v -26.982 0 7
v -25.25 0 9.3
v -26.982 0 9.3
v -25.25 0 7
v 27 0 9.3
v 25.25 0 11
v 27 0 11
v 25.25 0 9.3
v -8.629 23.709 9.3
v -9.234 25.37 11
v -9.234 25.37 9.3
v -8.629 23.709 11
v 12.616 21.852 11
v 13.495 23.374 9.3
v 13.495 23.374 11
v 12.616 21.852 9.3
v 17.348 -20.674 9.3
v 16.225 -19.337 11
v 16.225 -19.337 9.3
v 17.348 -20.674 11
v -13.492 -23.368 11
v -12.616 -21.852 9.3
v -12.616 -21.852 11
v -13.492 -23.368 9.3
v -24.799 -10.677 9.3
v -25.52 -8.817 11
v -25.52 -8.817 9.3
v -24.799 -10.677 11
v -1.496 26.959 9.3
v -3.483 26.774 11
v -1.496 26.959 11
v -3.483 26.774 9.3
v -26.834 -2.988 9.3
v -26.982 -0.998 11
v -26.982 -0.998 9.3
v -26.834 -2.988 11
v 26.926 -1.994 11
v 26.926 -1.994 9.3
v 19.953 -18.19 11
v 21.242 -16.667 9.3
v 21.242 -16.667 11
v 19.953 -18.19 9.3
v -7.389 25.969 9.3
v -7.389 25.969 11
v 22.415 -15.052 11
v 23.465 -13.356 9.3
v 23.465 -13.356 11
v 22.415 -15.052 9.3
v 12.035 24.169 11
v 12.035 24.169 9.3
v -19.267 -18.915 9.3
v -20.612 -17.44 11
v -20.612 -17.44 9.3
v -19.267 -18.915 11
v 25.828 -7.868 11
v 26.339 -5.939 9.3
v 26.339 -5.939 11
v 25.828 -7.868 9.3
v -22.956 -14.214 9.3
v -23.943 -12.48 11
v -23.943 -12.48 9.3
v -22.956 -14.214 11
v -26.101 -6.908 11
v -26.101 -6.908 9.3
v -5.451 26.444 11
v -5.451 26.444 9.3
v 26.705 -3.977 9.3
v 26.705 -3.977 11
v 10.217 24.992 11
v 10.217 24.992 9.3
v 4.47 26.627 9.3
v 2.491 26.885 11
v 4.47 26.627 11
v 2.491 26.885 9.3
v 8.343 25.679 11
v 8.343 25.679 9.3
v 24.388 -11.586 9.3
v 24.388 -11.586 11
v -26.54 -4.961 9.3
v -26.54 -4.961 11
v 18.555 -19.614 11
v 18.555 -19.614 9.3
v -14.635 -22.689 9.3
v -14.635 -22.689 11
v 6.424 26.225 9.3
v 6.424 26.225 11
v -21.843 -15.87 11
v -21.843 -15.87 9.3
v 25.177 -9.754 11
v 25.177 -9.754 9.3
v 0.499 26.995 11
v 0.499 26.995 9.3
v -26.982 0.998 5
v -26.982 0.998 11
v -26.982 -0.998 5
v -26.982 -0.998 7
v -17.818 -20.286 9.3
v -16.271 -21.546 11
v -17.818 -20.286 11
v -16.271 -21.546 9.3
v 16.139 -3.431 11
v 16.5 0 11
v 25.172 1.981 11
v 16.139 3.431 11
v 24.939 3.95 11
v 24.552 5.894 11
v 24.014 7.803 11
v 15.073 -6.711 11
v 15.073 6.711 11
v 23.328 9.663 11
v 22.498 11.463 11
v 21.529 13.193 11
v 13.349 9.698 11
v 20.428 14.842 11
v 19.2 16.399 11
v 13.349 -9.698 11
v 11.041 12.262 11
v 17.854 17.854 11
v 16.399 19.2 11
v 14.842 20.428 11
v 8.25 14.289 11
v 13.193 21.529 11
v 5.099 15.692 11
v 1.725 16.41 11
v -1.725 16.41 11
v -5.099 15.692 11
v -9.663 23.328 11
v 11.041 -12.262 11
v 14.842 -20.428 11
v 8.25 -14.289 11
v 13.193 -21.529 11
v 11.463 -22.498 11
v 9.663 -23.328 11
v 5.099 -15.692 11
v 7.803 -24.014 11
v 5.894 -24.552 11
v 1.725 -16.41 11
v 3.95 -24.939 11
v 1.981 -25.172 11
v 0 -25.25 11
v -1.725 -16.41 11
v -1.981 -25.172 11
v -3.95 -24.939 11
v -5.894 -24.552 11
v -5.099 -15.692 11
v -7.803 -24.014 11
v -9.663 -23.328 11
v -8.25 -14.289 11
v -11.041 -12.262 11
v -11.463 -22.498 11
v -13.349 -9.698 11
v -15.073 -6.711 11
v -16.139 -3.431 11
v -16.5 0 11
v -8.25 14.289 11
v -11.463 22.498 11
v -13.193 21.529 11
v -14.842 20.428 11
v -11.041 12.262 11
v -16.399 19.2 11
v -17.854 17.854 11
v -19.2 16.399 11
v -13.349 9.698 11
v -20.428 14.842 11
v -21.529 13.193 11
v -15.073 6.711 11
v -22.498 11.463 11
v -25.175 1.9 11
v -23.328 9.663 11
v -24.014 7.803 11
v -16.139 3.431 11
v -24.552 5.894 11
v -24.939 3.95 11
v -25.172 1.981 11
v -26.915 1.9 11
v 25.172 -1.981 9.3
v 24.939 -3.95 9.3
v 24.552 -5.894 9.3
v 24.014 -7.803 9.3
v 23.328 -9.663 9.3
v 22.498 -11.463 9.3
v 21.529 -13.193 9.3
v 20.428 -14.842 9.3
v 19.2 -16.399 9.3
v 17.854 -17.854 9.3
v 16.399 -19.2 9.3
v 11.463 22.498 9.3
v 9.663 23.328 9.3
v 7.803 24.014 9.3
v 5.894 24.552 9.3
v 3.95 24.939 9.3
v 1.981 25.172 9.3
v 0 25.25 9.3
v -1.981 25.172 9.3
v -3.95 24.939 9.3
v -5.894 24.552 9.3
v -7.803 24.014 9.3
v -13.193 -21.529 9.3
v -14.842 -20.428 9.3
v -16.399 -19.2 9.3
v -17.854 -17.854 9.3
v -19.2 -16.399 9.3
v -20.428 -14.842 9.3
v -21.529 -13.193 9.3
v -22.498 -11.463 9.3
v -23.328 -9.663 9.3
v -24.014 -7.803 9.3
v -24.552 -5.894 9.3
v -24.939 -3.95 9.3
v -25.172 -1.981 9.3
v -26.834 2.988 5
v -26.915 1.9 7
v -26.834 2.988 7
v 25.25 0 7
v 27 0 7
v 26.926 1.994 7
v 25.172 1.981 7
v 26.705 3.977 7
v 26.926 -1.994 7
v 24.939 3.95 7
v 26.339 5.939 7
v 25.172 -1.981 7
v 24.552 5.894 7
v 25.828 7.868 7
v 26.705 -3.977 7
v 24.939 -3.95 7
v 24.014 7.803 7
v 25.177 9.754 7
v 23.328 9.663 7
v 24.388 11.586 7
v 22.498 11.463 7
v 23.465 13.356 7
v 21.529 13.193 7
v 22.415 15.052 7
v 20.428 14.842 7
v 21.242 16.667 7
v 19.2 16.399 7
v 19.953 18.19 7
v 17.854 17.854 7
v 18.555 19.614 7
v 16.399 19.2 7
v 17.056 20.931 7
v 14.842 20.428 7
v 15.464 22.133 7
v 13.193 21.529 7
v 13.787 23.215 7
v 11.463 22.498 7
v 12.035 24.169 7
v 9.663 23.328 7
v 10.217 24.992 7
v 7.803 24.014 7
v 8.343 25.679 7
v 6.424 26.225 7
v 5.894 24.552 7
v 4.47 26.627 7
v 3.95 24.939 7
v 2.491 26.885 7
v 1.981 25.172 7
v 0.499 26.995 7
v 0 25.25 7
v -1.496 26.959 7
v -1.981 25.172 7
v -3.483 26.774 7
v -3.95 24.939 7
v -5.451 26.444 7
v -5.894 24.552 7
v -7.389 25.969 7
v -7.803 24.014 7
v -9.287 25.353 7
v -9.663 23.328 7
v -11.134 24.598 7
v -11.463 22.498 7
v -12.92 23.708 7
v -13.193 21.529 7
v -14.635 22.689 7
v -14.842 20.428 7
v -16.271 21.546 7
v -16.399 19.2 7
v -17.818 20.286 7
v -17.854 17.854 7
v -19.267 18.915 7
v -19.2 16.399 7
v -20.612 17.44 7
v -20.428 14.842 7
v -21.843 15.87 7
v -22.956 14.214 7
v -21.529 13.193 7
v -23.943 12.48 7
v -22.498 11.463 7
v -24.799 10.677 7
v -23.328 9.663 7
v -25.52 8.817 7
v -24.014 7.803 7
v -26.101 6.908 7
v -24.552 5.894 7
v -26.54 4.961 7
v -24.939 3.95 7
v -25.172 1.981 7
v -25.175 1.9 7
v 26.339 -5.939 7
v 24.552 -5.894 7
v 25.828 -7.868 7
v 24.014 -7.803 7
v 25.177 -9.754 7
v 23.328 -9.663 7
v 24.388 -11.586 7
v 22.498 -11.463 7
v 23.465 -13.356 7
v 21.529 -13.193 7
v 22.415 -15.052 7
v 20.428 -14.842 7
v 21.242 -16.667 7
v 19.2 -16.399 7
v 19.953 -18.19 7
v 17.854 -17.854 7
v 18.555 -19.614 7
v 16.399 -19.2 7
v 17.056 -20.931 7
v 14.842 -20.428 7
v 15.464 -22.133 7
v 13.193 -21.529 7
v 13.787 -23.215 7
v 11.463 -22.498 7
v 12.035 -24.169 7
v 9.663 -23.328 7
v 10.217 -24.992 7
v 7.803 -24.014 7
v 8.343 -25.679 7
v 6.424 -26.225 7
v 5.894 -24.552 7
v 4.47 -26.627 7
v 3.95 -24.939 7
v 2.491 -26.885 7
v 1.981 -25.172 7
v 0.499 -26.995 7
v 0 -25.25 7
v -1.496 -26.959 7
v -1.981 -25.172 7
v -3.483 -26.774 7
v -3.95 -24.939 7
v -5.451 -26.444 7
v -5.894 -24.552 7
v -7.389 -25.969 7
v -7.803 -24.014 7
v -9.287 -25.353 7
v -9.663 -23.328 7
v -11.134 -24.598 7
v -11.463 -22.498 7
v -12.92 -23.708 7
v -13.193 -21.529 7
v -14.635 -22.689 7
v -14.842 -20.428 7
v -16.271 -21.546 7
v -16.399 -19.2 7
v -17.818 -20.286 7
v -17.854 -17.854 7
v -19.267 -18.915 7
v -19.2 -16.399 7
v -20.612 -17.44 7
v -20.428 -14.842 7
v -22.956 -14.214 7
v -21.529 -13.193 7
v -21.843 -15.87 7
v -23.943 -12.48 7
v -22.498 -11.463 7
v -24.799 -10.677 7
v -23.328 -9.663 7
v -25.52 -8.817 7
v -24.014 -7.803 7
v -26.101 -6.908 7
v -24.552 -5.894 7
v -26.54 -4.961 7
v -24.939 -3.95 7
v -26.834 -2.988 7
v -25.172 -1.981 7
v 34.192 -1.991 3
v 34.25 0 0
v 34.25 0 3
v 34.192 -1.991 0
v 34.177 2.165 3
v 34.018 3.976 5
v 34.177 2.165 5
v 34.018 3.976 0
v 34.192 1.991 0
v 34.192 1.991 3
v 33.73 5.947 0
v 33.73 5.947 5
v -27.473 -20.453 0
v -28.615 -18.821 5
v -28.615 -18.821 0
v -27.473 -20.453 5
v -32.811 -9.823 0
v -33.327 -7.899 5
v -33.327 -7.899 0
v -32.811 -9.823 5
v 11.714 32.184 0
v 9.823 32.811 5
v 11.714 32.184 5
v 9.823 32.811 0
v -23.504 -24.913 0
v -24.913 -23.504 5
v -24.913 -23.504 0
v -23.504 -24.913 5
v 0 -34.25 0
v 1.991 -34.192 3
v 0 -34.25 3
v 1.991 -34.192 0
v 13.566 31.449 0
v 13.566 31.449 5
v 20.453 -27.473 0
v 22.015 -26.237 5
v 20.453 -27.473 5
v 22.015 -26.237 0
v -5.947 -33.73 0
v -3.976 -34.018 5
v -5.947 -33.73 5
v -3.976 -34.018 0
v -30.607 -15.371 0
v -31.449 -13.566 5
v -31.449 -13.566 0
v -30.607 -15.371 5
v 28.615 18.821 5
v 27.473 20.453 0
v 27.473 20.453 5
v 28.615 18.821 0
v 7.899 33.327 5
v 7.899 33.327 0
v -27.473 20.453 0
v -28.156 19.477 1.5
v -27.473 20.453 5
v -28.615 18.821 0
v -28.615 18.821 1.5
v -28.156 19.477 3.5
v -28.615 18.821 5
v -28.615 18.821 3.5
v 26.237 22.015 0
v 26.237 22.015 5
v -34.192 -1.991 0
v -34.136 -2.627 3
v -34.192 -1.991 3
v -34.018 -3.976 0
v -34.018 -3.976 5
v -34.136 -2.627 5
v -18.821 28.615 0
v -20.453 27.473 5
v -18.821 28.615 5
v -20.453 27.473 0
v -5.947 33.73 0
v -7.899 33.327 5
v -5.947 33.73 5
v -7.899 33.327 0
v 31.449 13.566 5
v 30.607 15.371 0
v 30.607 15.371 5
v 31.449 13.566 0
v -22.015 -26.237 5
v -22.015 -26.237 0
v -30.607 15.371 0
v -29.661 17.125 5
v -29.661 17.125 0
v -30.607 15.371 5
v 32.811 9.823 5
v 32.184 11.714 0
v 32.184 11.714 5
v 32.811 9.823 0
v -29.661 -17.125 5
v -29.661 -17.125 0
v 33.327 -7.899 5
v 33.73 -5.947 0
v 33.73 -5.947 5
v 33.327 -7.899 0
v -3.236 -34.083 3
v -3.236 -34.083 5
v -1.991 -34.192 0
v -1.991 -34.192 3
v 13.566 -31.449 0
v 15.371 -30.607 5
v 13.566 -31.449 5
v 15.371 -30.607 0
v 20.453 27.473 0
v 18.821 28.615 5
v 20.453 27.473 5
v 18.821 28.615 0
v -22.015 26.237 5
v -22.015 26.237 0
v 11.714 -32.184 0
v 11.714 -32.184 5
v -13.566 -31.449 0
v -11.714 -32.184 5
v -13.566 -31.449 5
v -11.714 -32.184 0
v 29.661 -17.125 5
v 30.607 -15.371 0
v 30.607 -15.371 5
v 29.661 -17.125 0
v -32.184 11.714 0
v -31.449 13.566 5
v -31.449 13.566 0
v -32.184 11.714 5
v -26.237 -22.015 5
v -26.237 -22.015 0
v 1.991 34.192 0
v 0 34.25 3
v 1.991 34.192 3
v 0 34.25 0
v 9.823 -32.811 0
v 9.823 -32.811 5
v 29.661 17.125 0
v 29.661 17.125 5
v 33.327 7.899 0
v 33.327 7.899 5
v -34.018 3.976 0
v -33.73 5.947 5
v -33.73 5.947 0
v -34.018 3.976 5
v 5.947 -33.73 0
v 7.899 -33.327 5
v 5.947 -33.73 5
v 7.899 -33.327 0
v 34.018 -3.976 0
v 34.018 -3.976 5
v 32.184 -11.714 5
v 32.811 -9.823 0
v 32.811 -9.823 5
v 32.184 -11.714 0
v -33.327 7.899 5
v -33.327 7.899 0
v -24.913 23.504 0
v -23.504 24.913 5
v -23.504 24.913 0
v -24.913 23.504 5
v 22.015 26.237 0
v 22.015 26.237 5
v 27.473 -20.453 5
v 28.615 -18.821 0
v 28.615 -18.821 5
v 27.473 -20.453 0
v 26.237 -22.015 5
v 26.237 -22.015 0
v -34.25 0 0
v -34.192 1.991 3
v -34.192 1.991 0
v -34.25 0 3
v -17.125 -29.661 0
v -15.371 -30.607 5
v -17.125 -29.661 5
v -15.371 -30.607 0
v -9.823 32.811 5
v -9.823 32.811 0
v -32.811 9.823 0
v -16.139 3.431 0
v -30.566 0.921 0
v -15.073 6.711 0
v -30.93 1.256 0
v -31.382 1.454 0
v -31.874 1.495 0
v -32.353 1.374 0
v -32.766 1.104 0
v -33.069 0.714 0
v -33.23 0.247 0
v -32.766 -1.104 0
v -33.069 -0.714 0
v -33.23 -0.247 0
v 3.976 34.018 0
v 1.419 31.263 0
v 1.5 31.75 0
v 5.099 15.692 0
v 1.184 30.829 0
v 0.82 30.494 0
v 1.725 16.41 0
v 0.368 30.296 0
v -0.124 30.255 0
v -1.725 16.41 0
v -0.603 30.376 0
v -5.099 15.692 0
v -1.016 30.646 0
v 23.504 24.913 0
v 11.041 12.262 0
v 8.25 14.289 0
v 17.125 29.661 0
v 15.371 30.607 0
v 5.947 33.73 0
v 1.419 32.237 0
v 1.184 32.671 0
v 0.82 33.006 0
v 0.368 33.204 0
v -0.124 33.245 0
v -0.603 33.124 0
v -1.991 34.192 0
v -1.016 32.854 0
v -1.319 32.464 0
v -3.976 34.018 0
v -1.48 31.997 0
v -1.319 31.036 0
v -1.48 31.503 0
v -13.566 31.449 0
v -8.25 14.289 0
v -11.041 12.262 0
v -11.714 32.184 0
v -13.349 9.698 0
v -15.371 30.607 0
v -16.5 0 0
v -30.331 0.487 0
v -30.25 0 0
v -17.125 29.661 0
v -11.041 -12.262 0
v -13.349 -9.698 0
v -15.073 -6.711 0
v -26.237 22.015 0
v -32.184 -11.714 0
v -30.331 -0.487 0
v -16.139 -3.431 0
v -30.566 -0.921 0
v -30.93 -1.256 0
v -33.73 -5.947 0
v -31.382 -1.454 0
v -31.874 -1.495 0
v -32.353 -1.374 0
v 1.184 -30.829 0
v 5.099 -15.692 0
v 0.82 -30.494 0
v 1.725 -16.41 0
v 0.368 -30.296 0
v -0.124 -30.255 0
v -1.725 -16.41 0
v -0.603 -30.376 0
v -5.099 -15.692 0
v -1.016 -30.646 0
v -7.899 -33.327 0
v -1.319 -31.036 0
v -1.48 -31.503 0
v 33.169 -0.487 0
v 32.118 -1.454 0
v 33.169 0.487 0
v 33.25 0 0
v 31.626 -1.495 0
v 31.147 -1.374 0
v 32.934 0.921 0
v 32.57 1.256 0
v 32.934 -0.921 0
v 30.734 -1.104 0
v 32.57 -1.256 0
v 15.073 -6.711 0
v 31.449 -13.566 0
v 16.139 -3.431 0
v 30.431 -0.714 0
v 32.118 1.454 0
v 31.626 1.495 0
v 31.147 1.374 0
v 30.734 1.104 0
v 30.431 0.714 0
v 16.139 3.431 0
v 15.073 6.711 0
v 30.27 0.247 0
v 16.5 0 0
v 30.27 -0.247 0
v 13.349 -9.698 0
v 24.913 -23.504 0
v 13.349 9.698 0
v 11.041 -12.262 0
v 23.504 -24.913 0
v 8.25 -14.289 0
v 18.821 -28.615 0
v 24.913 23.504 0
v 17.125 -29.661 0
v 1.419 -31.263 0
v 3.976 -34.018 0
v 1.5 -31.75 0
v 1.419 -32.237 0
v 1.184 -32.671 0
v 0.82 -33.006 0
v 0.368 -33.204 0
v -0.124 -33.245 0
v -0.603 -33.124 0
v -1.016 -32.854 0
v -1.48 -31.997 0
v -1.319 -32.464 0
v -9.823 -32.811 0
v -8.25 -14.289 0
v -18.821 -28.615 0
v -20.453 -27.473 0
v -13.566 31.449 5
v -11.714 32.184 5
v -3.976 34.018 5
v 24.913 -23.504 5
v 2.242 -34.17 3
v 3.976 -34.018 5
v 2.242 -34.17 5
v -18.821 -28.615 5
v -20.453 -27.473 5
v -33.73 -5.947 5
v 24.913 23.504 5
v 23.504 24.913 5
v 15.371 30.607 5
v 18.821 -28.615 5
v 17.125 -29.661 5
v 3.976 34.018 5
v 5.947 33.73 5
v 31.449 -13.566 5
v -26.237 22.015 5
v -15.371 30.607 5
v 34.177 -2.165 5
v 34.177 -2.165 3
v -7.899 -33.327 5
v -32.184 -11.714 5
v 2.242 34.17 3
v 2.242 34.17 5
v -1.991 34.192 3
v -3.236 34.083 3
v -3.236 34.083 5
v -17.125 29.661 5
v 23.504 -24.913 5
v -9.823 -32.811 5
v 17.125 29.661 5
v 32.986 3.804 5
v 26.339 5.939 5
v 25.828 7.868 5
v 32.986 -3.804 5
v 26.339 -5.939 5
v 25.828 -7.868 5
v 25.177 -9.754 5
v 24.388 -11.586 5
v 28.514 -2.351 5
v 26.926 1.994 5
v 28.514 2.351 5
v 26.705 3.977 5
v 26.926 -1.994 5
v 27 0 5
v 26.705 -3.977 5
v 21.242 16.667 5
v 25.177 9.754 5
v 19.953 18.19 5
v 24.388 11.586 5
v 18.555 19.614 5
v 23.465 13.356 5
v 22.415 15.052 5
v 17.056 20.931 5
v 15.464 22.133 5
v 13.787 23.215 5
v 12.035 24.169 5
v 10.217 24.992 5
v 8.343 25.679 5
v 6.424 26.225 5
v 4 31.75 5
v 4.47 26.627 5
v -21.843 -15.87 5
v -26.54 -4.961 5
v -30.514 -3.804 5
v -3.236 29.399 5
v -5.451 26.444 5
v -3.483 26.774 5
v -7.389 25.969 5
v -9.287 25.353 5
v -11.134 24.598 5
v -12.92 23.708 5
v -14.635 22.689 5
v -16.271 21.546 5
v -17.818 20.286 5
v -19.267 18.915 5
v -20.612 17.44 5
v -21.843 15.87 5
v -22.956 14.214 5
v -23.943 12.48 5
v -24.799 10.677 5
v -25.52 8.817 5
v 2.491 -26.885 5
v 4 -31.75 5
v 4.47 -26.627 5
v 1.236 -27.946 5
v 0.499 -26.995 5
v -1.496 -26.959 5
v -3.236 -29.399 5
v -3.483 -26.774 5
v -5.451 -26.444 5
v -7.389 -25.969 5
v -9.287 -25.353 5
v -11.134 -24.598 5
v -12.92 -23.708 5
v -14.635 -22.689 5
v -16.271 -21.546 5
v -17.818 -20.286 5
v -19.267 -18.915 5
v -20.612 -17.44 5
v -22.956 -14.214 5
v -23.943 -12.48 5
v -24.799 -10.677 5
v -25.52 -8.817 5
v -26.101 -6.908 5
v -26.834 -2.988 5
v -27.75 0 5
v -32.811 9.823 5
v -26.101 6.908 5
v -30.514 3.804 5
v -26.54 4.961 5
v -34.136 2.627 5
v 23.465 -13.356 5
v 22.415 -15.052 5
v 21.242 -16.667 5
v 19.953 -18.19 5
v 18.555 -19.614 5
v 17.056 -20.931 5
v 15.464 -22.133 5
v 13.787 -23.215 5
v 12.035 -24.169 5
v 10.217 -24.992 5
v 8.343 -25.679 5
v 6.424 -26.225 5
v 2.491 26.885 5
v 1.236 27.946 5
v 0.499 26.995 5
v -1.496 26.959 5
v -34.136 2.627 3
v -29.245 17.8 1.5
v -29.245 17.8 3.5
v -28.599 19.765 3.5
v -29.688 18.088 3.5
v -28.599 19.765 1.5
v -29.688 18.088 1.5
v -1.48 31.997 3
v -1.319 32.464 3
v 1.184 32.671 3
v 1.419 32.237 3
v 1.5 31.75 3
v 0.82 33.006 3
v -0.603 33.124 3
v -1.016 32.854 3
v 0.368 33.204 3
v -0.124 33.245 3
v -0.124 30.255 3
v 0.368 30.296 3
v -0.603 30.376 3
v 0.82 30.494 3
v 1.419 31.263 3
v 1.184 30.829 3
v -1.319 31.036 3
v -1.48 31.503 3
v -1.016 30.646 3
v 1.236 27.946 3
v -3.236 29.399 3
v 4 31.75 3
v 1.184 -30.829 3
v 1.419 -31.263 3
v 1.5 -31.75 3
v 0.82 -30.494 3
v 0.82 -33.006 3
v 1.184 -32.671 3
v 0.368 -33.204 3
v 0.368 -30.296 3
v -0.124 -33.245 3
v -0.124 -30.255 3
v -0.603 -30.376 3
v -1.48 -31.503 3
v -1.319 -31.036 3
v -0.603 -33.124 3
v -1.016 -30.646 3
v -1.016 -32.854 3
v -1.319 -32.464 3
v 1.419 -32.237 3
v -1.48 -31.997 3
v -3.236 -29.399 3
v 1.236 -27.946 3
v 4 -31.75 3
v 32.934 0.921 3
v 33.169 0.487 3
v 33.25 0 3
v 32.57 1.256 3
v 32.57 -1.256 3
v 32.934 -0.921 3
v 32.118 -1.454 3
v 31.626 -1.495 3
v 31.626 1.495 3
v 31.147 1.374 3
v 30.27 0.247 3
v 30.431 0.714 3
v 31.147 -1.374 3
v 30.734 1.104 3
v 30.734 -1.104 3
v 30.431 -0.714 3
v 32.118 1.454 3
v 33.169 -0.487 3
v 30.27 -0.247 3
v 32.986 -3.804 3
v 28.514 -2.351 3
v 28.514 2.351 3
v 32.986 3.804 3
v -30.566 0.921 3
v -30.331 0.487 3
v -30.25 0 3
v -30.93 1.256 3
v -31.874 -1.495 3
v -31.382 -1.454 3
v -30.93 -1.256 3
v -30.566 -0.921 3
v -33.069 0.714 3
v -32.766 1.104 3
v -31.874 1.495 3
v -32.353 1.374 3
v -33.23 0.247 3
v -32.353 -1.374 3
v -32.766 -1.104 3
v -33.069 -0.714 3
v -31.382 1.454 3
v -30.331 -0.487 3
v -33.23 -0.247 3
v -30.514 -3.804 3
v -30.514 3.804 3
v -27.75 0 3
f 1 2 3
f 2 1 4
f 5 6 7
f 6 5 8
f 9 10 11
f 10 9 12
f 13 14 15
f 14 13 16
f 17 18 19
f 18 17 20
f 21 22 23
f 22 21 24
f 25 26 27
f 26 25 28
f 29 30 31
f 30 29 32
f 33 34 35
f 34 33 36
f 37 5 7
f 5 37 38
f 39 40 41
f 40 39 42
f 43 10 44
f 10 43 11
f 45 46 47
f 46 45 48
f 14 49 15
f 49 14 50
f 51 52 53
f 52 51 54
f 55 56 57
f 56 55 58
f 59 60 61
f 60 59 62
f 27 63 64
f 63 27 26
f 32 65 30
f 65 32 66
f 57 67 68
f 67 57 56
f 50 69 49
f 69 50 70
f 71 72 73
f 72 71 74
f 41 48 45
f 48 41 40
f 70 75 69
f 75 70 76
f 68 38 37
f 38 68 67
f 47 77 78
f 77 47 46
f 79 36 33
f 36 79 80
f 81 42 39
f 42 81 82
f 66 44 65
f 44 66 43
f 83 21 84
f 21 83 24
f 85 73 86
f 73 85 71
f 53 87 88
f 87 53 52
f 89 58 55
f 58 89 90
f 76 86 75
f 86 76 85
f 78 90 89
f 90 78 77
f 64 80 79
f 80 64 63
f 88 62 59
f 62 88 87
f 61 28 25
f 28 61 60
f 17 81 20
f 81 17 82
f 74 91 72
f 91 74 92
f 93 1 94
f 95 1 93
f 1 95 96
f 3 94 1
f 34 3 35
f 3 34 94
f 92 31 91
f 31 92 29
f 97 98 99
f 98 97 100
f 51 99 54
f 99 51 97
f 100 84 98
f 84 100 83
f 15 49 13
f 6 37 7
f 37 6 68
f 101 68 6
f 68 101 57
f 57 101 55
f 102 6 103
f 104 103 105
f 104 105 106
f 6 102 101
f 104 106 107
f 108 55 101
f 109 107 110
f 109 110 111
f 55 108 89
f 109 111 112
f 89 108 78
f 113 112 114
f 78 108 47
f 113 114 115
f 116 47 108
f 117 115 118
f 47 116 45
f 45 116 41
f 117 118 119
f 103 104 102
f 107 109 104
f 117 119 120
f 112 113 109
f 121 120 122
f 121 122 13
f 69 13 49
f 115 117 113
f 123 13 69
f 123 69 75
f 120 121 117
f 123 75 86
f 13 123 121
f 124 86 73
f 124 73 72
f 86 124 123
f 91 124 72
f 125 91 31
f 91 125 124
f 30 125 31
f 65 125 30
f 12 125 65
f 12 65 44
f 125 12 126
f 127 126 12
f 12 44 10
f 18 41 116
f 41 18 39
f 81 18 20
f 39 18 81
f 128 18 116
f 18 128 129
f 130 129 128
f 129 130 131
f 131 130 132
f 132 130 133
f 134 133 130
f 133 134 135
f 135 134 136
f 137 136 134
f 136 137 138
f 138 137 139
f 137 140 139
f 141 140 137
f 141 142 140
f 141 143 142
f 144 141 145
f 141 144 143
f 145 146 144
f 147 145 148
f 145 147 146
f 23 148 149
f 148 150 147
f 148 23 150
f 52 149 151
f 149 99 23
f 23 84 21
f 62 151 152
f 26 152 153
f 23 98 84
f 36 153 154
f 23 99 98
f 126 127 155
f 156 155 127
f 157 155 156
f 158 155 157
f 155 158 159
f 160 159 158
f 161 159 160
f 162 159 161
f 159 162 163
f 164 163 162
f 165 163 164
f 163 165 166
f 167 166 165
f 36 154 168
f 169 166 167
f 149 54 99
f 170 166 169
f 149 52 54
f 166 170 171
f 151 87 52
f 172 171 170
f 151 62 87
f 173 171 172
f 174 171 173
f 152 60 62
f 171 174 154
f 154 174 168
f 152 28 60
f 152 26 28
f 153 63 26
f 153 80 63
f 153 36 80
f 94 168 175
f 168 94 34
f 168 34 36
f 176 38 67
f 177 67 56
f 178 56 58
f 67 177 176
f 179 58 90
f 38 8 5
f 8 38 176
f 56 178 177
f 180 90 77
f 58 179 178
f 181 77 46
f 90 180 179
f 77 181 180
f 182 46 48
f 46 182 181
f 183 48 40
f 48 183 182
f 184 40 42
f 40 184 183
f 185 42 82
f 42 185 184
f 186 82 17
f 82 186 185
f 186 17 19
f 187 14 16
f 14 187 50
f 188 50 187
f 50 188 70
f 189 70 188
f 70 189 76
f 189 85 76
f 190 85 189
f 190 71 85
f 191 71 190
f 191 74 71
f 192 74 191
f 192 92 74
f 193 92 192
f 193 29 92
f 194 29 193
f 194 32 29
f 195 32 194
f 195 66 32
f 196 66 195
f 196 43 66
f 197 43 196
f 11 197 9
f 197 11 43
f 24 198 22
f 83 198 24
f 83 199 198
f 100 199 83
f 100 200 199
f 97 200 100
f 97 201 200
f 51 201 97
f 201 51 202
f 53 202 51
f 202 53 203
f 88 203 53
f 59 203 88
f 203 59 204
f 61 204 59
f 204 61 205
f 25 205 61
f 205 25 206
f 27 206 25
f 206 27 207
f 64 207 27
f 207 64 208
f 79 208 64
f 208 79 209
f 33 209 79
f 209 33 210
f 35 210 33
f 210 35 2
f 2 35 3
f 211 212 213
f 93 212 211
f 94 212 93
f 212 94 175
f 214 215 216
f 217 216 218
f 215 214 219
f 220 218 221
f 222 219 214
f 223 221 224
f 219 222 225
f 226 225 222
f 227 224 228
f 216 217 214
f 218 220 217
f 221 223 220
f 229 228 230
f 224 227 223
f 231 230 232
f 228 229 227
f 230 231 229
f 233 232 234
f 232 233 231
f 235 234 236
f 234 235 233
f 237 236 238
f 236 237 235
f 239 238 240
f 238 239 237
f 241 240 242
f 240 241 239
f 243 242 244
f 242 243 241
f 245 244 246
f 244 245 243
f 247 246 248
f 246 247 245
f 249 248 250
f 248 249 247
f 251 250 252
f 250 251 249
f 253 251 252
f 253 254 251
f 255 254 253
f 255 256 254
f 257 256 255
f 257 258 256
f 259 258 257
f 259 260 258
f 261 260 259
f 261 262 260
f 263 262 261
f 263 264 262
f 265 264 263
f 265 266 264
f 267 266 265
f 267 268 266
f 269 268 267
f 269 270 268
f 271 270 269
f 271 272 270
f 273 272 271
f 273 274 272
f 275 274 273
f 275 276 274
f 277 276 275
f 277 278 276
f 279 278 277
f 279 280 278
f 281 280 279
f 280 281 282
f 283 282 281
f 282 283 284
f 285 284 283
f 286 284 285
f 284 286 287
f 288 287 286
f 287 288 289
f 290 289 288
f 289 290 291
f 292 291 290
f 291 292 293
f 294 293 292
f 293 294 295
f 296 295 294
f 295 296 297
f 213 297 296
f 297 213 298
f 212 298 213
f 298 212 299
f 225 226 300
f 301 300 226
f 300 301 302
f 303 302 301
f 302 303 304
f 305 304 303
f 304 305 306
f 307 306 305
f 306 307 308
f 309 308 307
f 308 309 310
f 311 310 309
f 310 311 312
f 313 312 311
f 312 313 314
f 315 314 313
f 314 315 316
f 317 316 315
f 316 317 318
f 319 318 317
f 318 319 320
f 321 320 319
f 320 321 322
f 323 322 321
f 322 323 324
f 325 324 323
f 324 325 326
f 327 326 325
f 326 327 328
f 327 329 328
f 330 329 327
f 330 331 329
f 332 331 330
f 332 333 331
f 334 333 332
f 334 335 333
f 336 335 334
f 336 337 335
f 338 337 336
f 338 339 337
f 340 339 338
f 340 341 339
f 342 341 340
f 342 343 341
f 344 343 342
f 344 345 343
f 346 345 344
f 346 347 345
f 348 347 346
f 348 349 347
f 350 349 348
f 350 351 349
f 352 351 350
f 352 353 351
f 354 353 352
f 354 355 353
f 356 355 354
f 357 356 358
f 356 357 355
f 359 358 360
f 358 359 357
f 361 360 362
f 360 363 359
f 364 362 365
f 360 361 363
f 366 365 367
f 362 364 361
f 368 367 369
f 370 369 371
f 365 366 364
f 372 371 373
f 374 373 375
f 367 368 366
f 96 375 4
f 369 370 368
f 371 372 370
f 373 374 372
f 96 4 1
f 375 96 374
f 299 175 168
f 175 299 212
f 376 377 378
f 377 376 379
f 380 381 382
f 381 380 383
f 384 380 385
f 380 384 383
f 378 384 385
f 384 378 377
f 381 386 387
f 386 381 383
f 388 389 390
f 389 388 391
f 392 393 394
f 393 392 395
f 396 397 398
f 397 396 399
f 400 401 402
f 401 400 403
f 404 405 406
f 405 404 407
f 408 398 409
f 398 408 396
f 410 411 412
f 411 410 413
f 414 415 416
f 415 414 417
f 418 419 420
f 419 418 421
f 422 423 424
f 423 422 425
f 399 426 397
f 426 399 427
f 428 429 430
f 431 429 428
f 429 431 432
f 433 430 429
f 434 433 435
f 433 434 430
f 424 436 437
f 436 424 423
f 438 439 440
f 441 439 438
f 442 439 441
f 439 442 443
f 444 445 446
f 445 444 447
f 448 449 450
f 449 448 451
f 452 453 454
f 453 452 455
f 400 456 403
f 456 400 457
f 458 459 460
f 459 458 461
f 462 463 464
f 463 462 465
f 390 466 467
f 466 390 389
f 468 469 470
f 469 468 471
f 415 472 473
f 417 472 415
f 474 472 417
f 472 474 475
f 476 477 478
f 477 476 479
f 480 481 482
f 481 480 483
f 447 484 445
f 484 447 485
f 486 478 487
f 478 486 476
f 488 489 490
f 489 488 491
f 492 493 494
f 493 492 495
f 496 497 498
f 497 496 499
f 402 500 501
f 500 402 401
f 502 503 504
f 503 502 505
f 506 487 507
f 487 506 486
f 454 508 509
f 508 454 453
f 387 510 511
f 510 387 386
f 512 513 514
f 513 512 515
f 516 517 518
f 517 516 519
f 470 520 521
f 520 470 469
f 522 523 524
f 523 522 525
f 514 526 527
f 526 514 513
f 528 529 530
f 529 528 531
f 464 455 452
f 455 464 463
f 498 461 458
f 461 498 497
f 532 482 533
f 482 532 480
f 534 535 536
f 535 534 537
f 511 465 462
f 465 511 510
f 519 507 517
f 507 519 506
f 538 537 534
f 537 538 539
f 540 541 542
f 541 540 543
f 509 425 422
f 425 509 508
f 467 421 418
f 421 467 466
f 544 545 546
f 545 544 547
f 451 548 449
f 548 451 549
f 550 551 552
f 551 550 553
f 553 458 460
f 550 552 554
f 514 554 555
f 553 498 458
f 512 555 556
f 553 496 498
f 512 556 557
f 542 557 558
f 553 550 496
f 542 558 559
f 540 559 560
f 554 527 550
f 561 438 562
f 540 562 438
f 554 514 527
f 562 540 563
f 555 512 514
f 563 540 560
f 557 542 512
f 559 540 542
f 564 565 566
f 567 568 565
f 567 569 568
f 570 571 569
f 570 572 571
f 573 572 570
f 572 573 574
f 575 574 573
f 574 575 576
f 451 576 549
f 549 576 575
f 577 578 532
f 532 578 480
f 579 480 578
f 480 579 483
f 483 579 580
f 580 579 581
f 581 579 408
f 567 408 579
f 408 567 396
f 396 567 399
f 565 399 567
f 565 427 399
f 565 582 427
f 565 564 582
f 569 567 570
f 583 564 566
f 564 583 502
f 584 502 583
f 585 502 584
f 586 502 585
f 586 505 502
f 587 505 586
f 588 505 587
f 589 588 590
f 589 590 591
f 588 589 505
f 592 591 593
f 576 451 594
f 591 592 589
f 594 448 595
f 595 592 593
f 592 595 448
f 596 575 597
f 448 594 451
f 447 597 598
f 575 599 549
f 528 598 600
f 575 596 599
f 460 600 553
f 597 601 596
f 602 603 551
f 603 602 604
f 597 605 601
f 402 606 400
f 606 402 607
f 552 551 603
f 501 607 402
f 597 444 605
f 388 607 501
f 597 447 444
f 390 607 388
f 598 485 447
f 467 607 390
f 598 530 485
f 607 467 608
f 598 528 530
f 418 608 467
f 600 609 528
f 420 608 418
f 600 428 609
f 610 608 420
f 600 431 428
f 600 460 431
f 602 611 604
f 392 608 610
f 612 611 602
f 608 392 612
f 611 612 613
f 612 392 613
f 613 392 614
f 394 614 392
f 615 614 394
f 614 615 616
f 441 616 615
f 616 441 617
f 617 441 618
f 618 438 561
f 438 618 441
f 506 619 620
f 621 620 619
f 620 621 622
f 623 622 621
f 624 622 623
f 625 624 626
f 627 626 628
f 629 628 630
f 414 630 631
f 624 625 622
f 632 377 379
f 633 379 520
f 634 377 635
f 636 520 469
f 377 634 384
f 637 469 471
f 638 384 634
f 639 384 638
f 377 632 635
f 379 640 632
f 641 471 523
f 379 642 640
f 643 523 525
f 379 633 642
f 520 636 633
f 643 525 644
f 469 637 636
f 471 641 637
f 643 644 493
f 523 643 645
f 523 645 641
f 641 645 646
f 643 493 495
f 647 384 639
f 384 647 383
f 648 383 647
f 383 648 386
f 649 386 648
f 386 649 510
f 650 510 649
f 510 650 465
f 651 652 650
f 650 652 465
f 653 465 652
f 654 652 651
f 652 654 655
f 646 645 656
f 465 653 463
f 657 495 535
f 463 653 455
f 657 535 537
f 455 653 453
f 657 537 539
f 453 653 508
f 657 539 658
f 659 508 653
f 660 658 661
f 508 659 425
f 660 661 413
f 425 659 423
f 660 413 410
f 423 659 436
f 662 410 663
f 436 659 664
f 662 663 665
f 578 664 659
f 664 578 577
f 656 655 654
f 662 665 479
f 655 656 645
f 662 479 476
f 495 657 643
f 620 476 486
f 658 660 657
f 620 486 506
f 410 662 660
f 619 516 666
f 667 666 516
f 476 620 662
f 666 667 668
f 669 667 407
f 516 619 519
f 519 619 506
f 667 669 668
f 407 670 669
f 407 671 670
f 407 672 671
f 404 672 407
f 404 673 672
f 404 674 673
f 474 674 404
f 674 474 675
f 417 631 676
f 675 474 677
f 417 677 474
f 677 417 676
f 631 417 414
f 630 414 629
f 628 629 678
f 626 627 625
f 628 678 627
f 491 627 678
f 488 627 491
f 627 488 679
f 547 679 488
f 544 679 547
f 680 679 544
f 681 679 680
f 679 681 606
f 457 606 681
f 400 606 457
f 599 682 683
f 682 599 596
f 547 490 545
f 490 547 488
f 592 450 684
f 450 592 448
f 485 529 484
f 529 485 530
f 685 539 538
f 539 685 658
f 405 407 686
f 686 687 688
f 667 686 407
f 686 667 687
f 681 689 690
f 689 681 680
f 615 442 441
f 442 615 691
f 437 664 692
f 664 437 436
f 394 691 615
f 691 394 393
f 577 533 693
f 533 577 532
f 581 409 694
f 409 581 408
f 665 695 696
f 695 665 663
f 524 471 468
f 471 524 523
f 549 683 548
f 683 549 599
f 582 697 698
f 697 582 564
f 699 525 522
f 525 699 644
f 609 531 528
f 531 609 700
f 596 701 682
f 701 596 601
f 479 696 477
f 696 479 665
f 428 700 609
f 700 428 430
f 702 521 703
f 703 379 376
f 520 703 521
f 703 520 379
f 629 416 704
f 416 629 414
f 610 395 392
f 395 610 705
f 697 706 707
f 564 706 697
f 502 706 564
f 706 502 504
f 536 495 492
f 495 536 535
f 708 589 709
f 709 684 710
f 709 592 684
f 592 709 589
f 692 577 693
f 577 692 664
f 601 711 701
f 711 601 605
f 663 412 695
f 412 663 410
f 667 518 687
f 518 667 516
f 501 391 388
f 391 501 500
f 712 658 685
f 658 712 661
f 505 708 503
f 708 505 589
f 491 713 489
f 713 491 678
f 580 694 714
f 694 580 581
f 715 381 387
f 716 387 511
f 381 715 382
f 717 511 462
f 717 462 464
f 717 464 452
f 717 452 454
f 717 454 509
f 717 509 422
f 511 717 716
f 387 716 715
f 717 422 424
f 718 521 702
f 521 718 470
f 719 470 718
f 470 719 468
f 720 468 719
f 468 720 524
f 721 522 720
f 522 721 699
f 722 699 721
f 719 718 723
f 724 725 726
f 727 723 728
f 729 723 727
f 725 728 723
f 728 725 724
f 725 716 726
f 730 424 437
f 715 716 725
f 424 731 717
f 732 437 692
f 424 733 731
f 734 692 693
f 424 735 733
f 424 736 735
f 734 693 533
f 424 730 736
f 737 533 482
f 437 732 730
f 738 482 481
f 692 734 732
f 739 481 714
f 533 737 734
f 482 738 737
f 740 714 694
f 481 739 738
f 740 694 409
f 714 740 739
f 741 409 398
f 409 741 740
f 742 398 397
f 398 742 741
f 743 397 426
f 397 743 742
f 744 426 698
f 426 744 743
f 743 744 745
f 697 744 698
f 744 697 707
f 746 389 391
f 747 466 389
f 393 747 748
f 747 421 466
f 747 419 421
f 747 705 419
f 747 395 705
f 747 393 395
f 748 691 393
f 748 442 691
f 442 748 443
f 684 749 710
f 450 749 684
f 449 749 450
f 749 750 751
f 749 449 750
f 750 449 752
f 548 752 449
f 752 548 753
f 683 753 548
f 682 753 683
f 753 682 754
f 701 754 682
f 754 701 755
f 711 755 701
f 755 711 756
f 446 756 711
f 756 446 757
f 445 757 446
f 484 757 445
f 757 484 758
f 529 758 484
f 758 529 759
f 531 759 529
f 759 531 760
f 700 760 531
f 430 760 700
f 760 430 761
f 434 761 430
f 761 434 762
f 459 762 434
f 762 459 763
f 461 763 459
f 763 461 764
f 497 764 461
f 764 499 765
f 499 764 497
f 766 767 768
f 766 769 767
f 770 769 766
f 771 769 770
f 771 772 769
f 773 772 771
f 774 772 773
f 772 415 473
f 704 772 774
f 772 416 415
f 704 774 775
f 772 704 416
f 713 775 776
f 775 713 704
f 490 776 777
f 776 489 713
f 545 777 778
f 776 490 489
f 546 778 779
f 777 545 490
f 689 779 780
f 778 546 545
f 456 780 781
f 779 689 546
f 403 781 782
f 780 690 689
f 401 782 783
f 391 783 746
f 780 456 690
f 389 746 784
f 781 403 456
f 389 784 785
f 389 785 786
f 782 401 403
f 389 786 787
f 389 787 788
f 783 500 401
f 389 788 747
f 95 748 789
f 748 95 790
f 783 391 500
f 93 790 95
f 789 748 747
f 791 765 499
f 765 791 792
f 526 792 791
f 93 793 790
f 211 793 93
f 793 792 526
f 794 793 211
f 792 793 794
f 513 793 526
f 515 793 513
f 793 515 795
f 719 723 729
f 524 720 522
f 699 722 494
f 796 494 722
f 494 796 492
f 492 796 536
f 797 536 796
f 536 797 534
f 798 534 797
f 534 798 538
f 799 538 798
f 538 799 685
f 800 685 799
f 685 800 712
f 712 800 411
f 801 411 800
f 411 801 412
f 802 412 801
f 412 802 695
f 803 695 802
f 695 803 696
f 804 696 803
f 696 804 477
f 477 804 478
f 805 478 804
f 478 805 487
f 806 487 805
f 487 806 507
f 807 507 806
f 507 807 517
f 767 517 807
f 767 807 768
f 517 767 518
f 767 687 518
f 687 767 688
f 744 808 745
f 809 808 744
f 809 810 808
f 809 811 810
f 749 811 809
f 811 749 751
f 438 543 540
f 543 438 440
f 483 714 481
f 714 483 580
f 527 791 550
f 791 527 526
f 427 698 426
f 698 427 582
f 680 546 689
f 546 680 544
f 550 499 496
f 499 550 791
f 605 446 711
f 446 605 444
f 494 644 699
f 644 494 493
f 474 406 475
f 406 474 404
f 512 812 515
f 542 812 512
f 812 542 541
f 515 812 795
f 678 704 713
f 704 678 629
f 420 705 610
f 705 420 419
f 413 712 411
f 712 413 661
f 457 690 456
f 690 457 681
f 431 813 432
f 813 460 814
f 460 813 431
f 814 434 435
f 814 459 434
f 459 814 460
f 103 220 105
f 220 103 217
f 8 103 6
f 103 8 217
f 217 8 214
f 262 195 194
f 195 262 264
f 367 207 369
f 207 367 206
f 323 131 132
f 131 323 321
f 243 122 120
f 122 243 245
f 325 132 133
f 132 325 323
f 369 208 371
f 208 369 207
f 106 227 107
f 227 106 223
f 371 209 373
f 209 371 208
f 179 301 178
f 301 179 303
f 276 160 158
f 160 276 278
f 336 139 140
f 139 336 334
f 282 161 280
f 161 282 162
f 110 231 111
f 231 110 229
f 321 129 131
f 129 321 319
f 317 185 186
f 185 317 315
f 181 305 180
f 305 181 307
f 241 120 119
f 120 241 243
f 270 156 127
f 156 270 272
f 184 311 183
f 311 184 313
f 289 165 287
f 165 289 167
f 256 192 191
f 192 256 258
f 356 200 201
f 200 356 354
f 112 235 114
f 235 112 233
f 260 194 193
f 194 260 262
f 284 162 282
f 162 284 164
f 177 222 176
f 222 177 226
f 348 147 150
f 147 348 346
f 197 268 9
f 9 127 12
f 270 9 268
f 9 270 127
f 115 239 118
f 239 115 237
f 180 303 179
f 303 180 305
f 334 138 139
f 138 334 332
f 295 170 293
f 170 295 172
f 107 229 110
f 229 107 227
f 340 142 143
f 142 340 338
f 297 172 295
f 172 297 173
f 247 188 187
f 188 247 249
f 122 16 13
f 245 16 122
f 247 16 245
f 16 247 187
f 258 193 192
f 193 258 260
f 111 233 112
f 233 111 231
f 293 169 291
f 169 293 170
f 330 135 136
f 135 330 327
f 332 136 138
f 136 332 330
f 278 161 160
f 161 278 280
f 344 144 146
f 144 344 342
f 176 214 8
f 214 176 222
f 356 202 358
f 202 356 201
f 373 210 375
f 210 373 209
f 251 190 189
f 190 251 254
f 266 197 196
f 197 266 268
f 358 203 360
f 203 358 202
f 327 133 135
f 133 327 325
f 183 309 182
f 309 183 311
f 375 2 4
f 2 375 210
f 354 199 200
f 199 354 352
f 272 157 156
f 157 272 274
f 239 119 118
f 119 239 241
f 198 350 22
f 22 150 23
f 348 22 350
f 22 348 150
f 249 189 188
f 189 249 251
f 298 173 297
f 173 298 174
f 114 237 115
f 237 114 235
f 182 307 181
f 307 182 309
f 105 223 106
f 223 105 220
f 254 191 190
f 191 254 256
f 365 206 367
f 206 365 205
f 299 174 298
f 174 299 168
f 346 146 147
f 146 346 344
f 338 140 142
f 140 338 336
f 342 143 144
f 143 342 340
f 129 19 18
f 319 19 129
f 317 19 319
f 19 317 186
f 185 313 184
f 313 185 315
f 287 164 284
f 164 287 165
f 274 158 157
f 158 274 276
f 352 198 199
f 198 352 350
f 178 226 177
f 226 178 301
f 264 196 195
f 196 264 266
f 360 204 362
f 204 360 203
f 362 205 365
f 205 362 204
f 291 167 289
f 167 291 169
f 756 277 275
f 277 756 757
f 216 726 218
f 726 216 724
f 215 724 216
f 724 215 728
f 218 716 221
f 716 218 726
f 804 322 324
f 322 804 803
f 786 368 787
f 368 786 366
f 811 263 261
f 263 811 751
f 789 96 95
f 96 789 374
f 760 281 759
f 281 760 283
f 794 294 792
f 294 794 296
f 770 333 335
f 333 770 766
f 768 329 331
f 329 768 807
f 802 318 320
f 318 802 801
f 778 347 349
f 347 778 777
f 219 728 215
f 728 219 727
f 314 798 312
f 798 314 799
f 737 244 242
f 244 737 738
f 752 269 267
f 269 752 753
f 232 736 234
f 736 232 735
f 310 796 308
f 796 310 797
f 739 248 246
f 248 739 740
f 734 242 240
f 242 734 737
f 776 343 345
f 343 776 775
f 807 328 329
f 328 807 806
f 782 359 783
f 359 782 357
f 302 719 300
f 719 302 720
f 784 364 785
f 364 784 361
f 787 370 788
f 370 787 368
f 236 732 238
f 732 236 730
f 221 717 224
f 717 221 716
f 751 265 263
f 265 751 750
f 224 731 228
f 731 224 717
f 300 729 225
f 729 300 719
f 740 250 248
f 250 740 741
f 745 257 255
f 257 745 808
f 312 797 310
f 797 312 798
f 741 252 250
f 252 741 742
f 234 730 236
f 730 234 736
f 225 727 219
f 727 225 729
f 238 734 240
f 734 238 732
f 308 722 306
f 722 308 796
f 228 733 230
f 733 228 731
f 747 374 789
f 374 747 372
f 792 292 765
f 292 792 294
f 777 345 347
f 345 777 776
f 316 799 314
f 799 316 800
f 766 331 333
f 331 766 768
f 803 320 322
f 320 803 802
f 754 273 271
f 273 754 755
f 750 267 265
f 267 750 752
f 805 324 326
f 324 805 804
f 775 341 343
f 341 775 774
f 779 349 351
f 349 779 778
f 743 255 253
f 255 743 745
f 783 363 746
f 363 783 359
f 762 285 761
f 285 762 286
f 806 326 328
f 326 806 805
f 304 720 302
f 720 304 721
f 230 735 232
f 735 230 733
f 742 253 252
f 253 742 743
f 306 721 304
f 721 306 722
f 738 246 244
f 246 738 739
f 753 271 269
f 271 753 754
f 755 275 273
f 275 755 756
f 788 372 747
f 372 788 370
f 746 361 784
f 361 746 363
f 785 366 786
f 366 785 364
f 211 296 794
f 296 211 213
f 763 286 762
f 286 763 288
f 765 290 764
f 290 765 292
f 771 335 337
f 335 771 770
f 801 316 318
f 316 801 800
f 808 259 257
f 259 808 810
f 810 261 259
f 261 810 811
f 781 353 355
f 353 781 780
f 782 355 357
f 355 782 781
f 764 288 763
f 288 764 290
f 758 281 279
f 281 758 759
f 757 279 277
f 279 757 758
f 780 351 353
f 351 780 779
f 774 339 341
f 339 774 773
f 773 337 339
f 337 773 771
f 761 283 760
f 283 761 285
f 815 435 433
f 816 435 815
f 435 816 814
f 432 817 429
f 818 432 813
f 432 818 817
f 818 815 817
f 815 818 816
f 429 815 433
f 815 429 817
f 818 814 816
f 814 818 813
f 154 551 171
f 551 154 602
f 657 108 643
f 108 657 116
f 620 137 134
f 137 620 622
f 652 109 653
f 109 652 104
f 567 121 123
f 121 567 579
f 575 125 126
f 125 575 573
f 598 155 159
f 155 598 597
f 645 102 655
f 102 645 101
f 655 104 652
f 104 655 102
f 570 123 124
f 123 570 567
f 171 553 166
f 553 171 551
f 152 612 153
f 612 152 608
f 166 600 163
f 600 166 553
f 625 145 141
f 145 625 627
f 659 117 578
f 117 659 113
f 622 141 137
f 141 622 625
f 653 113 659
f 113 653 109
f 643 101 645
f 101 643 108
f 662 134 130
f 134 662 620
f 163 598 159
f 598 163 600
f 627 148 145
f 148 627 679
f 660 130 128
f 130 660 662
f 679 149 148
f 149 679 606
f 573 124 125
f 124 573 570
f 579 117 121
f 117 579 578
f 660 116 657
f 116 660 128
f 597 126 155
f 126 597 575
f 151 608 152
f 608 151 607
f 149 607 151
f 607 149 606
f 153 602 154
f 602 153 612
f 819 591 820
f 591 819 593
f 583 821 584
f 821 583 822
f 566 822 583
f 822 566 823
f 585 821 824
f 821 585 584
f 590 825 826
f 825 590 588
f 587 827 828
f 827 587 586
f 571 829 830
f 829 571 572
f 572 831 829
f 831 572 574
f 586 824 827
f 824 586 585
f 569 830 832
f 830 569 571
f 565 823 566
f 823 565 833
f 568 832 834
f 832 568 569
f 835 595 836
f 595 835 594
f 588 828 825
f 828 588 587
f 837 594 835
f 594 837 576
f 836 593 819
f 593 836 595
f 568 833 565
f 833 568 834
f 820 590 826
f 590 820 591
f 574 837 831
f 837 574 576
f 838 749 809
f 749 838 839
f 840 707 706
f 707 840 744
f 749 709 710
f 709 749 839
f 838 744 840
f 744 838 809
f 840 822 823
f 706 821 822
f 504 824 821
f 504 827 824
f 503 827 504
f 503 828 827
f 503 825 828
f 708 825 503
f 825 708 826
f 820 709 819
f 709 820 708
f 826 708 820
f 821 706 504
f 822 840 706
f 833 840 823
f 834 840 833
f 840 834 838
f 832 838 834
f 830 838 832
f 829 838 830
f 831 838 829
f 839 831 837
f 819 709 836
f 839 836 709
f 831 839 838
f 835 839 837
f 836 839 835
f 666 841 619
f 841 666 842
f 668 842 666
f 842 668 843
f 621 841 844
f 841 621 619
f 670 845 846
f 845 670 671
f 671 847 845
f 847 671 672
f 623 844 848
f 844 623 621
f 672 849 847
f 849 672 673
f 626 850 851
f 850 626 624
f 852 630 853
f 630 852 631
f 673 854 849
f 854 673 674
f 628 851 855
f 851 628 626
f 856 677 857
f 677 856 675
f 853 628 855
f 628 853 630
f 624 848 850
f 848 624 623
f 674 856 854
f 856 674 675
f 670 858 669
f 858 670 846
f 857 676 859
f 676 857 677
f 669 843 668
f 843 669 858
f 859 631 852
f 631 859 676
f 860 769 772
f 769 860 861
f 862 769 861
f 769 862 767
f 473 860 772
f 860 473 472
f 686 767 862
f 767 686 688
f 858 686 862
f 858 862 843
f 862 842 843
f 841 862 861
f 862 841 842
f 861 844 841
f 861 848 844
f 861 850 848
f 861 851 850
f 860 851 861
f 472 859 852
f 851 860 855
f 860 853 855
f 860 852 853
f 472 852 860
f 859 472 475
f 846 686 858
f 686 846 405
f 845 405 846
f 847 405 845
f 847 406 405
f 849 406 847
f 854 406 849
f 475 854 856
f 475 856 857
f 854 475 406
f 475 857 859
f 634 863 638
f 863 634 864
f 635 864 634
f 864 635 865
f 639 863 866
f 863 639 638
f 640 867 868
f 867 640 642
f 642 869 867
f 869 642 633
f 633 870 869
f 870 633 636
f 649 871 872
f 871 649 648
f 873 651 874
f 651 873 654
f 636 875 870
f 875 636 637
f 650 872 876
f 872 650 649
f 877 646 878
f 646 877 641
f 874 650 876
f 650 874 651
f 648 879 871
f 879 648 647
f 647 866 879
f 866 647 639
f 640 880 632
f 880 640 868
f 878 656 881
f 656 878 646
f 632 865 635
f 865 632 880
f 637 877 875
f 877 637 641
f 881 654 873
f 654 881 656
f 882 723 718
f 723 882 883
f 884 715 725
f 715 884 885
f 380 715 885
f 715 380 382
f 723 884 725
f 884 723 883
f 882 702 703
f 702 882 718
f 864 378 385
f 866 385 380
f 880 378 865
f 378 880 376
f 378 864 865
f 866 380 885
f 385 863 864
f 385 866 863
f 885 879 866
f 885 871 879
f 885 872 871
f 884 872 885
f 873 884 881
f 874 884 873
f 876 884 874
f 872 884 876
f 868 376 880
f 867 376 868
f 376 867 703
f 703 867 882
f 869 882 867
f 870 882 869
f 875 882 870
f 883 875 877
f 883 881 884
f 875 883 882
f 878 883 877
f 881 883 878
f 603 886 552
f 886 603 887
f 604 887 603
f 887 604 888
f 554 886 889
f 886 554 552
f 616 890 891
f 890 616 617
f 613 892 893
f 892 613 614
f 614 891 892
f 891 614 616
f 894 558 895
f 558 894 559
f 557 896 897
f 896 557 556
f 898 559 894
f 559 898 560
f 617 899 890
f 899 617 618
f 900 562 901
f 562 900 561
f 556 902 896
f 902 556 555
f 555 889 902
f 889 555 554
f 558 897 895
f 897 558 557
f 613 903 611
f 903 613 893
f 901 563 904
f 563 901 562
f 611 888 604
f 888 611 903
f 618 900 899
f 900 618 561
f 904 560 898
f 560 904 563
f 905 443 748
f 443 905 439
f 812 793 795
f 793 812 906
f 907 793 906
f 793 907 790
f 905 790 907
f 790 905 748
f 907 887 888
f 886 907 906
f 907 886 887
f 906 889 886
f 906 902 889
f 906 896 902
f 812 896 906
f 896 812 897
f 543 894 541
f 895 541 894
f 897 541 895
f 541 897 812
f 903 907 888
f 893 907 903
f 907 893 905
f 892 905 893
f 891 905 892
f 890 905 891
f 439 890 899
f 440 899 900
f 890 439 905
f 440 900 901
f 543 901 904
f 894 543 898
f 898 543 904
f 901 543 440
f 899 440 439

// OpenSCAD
//Title: Canon EF mount module
//Author: Alex English - ProtoParadigm
//Date: 8-8-2011
//License: GPL2

//Notes: This will create the actual bayonet and supporting structure, complete with the alignment dot.  To use, you will need to build whatever you're making into the center of this, or onto the other side of it.  As shown by a render of this file, you can see a cylinder cut through the middle of it for illustration.  The module itself does not have such a hole, so you can put whatever kind of hole you wish in it.

module EFmount() {
	$fa = 1;
	union() {
		#cylinder(h = 5, r = 68.5/2);
		translate([0, 0, 7])
			cylinder(h = 4, r = 50.5/2);
		translate([0, 0, 5])
			cylinder(h = 2, r = 54/2);
		translate([0, 0, 11])
			cylinder(h = 1.5, r = 41.5/2);
		translate([0, 0, 12.5])
			cylinder(h = 3.2, r1 = 39.7/2, r2 = 39.5/2);
		translate([0, 0, 7])
			threads();
		rotate([0, 0, -33])
			translate([-68.5/2, 0, 2.5])
				cube(size=[1, 2, 2], center = true);
	}
}

module threads() {
	difference() {
		cylinder(h = 4, r = 54/2);
		cylinder(h = 4, r = 50.4/2);
		cylinder(h = 2.3, r = 54/2);
		for(i = [ [0, 0, 0], [180, 0, -70], [0, 0, -120], [180, 0, -180], [0, 0, -230], [180, 0, -300] ])
		{
			rotate(i)	
				translate([-35, 0, -5])
					cube(size=[40, 18, 10]);
		}
	}
	intersection() {
		difference() {
			cylinder(h = 4, r = 54/2);
			cylinder(h = 4, r = 50.4/2);
		}
		translate([-54/2-1, 0, 0])
			cube(size=[4, 1.9, 4], center = false);
	}
	
	
}

rad = 63.5/2;

difference() {
	EFmount();
	translate([0,0,-2]) cylinder(h = 20, r = 33/2);

	translate([0,rad,-2]) cylinder(h=10,r=3/2,$fs=0.5);
	translate([0,rad,3]) cylinder(h=10,r=8/2,$fs=12);

	translate([0,-rad,-2]) cylinder(h=10,r=3/2,$fs=0.5);
	translate([0,-rad,3]) cylinder(h=10,r=8/2,$fs=12);

	translate([rad,0,-2]) cylinder(h=10,r=3/2,$fs=0.5);
	translate([rad,0,3]) cylinder(h=10,r=8/2,$fs=12);

	translate([-rad,0,-2]) cylinder(h=10,r=3/2,$fs=0.5);
	translate([-rad,0,3]) cylinder(h=10,r=8/2,$fs=12);

	translate([0,0,11]) cylinder(h = 20, r = 33);



}
